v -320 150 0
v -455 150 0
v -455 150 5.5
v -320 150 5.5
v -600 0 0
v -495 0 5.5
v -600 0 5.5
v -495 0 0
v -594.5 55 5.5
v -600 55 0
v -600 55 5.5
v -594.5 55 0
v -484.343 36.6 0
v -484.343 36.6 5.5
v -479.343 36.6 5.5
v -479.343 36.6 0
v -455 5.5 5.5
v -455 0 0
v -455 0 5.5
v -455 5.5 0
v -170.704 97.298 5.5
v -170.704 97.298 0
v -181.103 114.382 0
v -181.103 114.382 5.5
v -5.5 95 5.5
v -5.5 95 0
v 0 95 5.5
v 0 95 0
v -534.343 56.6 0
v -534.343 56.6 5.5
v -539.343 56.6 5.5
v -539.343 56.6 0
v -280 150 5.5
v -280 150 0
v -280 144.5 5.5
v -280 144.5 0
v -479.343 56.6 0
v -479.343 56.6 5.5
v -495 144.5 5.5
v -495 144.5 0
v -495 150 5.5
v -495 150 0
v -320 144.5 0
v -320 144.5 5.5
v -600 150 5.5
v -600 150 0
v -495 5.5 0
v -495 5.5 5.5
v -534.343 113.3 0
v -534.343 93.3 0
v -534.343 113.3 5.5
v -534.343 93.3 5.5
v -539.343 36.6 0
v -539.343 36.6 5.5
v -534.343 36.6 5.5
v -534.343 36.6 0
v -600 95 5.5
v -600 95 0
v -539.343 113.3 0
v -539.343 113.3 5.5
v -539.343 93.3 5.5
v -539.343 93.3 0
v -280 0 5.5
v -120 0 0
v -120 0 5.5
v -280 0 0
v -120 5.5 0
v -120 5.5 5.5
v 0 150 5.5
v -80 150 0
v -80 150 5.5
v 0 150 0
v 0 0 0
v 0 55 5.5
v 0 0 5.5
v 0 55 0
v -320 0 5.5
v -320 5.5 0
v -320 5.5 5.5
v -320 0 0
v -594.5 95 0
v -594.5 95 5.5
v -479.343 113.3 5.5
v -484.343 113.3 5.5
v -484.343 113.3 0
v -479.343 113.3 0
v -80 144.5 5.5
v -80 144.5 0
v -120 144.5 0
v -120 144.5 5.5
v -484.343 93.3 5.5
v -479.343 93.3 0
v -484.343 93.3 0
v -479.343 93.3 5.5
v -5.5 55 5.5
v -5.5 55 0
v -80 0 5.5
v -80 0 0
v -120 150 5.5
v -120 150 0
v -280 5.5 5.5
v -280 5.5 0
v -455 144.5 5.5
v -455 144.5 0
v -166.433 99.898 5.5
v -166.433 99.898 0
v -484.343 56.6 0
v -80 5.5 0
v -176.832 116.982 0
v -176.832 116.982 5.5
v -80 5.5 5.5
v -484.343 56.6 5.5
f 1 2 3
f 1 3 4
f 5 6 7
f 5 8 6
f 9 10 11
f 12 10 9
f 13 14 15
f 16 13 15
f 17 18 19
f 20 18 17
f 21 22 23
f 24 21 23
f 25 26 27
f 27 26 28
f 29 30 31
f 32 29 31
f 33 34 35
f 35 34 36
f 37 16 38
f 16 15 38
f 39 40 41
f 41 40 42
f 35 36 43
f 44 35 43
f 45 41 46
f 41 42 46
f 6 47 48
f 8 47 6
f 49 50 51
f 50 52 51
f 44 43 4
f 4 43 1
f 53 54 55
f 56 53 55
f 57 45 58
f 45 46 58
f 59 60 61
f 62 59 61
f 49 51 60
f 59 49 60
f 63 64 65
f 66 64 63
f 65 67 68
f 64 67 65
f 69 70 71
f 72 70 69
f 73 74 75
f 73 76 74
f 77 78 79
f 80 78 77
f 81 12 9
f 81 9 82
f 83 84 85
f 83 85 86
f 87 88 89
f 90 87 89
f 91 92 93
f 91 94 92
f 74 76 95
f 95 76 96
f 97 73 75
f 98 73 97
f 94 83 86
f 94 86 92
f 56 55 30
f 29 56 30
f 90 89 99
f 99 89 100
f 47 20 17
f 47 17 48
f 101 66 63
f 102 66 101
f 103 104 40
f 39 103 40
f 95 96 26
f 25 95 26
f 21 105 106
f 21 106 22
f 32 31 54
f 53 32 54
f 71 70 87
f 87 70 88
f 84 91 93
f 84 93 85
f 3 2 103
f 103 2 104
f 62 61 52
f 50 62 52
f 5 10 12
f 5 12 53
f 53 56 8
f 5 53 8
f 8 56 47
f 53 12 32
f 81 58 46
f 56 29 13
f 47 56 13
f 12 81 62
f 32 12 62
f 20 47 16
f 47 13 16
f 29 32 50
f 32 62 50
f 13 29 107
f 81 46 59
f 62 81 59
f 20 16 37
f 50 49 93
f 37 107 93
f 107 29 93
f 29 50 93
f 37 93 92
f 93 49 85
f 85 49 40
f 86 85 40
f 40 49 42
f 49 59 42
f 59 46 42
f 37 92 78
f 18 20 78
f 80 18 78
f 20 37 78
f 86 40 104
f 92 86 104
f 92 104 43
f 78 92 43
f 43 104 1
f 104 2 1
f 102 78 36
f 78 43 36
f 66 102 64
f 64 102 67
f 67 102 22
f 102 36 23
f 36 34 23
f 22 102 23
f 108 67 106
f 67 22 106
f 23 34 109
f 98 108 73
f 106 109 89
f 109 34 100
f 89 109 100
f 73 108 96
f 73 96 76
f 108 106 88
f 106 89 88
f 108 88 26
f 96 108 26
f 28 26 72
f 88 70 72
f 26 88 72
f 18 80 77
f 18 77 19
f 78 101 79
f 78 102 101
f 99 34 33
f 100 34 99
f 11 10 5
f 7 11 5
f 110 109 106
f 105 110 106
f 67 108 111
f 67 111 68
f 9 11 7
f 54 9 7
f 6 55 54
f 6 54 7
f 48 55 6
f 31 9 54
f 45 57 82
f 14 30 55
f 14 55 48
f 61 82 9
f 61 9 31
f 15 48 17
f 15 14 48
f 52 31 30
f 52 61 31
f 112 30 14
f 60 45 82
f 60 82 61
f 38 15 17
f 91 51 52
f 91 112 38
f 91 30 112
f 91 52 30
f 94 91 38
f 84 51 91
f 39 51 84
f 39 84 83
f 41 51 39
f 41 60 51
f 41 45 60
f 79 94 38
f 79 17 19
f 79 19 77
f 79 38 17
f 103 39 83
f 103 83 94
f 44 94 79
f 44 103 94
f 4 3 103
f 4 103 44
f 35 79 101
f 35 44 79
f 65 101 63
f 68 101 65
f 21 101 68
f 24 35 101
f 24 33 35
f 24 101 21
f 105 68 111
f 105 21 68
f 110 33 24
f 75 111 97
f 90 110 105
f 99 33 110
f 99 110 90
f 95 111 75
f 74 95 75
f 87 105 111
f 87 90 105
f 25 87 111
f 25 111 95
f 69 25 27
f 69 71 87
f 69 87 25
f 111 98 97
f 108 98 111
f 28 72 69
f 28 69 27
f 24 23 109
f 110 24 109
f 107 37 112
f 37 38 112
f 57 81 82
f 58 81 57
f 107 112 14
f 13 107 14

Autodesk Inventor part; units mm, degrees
ref_plane "YZ Plane" through (0, 0, 0) normal (1, 0, 0) x (0, 1, 0)
ref_plane "XZ Plane" through (0, 0, 0) normal (0, 1, 0) x (-1, 0, 0)
ref_plane "XY Plane" through (0, 0, 0) normal (0, 0, 1) x (1, 0, 0)
sketch "Sketch1" plane through (0, 0, 0) normal (0, 0, 1) x (1, 0, 0)
  line L0 (-280, 0) -> (-280, 5.5)
  line L1 (-280, 5.5) -> (-320, 5.5)
  line L2 (-320, 5.5) -> (-320, 0)
  line L3 (-80, 0) -> (-80, 5.5)
  line L4 (-80, 5.5) -> (-120, 5.5)
  line L5 (-120, 5.5) -> (-120, 0)
  line L6 (-280, 150) -> (-280, 144.5)
  line L7 (-280, 144.5) -> (-320, 144.5)
  line L8 (-320, 144.5) -> (-320, 150)
  line L9 (-80, 150) -> (-80, 144.5)
  line L10 (-80, 144.5) -> (-120, 144.5)
  line L11 (-120, 144.5) -> (-120, 150)
  line L12 (-455, 0) -> (-455, 5.5)
  line L13 (-455, 5.5) -> (-495, 5.5)
  line L14 (-495, 5.5) -> (-495, 0)
  line L15 (-455, 150) -> (-455, 144.5)
  line L16 (-455, 144.5) -> (-495, 144.5)
  line L17 (-495, 144.5) -> (-495, 150)
  line L18 (-600, 55) -> (-594.5, 55)
  line L19 (-594.5, 55) -> (-594.5, 95)
  line L20 (-594.5, 95) -> (-600, 95)
  line L21 (0, 55) -> (-5.5, 55)
  line L22 (-5.5, 55) -> (-5.5, 95)
  line L23 (-5.5, 95) -> (0, 95)
  line L24 (-495, 150) -> (-600, 150)
  line L25 (-455, 150) -> (-320, 150)
  line L26 (-280, 150) -> (-120, 150)
  line L27 (-80, 150) -> (0, 150)
  line L28 (0, 0) -> (-80, 0)
  line L29 (-120, 0) -> (-280, 0)
  line L30 (-320, 0) -> (-455, 0)
  line L31 (-495, 0) -> (-600, 0)
  line L32 (0, 150) -> (0, 95)
  line L33 (0, 55) -> (0, 0)
  line L34 (-600, 150) -> (-600, 95)
  line L35 (-600, 55) -> (-600, 0)
  dimension "d0" = 600
  dimension "d1" = 150
  dimension "d4" = 40
  dimension "d5" = 5.5
  dimension "d8" = 40
  dimension "d9" = 5.5
  dimension "d10" = 40
  dimension "d11" = 5.5
  dimension "d12" = 40
  dimension "d13" = 5.5
  dimension "d14" = 40
  dimension "d15" = 5.5
  dimension "d17" = 5.5
  dimension "d18" = 40
  dimension "d19" = 5.5
  dimension "d23" = 480
extrude "Extrusion1" add sketch "Sketch1" along normal blind 5.5
sketch "Sketch2" plane through (0, 0, 5.5) normal (0, 0, 1) x (1, 0, 0)
  line L0 (-539.343, 36.6) -> (-534.3429, 36.6)
  line L1 (-534.3429, 36.6) -> (-534.3429, 56.6)
  line L2 (-534.3429, 56.6) -> (-539.343, 56.6)
  line L3 (-539.343, 56.6) -> (-539.343, 36.6)
  line L4 (-539.343, 93.3) -> (-534.343, 93.3)
  line L5 (-534.343, 93.3) -> (-534.343, 113.3)
  line L6 (-534.343, 113.3) -> (-539.343, 113.3)
  line L7 (-539.343, 113.3) -> (-539.343, 93.3)
  line L8 (-484.3429, 113.3) -> (-479.3429, 113.3)
  line L9 (-479.3429, 113.3) -> (-479.3429, 93.3)
  line L10 (-479.3429, 93.3) -> (-484.3429, 93.3)
  line L11 (-484.3429, 93.3) -> (-484.3429, 113.3)
  line L12 (-479.3429, 56.6) -> (-484.3429, 56.6)
  line L13 (-484.3429, 56.6) -> (-484.3429, 36.6)
  line L14 (-484.3429, 36.6) -> (-479.3429, 36.6)
  line L15 (-479.3429, 36.6) -> (-479.3429, 56.6)
  line L16 (-600, 150) -> (-600, 95) projected
  point P0 (0, 0)
  dimension "d26" = 20
  dimension "d27" = 5
  dimension "d28" = 20
  dimension "d29" = 5
  dimension "d30" = 20
  dimension "d33" = 60.657
extrude "Extrusion2" cut sketch "Sketch2" against normal blind 10
sketch "Sketch3" plane through (0, 0, 0) normal (0, 0, -1) x (-1, 0, 0)
  line L0 (181.1029, 114.3822) -> (176.8319, 116.9819)
  line L1 (176.8319, 116.9819) -> (166.433, 99.898)
  line L2 (166.433, 99.898) -> (170.704, 97.2982)
  line L3 (170.704, 97.2982) -> (181.1029, 114.3822)
  point P0 (0, 0)
  dimension "d34" = 5
  dimension "d35" = 20
extrude "Extrusion3" cut sketch "Sketch3" against normal blind 10
properties part number "lado1"
